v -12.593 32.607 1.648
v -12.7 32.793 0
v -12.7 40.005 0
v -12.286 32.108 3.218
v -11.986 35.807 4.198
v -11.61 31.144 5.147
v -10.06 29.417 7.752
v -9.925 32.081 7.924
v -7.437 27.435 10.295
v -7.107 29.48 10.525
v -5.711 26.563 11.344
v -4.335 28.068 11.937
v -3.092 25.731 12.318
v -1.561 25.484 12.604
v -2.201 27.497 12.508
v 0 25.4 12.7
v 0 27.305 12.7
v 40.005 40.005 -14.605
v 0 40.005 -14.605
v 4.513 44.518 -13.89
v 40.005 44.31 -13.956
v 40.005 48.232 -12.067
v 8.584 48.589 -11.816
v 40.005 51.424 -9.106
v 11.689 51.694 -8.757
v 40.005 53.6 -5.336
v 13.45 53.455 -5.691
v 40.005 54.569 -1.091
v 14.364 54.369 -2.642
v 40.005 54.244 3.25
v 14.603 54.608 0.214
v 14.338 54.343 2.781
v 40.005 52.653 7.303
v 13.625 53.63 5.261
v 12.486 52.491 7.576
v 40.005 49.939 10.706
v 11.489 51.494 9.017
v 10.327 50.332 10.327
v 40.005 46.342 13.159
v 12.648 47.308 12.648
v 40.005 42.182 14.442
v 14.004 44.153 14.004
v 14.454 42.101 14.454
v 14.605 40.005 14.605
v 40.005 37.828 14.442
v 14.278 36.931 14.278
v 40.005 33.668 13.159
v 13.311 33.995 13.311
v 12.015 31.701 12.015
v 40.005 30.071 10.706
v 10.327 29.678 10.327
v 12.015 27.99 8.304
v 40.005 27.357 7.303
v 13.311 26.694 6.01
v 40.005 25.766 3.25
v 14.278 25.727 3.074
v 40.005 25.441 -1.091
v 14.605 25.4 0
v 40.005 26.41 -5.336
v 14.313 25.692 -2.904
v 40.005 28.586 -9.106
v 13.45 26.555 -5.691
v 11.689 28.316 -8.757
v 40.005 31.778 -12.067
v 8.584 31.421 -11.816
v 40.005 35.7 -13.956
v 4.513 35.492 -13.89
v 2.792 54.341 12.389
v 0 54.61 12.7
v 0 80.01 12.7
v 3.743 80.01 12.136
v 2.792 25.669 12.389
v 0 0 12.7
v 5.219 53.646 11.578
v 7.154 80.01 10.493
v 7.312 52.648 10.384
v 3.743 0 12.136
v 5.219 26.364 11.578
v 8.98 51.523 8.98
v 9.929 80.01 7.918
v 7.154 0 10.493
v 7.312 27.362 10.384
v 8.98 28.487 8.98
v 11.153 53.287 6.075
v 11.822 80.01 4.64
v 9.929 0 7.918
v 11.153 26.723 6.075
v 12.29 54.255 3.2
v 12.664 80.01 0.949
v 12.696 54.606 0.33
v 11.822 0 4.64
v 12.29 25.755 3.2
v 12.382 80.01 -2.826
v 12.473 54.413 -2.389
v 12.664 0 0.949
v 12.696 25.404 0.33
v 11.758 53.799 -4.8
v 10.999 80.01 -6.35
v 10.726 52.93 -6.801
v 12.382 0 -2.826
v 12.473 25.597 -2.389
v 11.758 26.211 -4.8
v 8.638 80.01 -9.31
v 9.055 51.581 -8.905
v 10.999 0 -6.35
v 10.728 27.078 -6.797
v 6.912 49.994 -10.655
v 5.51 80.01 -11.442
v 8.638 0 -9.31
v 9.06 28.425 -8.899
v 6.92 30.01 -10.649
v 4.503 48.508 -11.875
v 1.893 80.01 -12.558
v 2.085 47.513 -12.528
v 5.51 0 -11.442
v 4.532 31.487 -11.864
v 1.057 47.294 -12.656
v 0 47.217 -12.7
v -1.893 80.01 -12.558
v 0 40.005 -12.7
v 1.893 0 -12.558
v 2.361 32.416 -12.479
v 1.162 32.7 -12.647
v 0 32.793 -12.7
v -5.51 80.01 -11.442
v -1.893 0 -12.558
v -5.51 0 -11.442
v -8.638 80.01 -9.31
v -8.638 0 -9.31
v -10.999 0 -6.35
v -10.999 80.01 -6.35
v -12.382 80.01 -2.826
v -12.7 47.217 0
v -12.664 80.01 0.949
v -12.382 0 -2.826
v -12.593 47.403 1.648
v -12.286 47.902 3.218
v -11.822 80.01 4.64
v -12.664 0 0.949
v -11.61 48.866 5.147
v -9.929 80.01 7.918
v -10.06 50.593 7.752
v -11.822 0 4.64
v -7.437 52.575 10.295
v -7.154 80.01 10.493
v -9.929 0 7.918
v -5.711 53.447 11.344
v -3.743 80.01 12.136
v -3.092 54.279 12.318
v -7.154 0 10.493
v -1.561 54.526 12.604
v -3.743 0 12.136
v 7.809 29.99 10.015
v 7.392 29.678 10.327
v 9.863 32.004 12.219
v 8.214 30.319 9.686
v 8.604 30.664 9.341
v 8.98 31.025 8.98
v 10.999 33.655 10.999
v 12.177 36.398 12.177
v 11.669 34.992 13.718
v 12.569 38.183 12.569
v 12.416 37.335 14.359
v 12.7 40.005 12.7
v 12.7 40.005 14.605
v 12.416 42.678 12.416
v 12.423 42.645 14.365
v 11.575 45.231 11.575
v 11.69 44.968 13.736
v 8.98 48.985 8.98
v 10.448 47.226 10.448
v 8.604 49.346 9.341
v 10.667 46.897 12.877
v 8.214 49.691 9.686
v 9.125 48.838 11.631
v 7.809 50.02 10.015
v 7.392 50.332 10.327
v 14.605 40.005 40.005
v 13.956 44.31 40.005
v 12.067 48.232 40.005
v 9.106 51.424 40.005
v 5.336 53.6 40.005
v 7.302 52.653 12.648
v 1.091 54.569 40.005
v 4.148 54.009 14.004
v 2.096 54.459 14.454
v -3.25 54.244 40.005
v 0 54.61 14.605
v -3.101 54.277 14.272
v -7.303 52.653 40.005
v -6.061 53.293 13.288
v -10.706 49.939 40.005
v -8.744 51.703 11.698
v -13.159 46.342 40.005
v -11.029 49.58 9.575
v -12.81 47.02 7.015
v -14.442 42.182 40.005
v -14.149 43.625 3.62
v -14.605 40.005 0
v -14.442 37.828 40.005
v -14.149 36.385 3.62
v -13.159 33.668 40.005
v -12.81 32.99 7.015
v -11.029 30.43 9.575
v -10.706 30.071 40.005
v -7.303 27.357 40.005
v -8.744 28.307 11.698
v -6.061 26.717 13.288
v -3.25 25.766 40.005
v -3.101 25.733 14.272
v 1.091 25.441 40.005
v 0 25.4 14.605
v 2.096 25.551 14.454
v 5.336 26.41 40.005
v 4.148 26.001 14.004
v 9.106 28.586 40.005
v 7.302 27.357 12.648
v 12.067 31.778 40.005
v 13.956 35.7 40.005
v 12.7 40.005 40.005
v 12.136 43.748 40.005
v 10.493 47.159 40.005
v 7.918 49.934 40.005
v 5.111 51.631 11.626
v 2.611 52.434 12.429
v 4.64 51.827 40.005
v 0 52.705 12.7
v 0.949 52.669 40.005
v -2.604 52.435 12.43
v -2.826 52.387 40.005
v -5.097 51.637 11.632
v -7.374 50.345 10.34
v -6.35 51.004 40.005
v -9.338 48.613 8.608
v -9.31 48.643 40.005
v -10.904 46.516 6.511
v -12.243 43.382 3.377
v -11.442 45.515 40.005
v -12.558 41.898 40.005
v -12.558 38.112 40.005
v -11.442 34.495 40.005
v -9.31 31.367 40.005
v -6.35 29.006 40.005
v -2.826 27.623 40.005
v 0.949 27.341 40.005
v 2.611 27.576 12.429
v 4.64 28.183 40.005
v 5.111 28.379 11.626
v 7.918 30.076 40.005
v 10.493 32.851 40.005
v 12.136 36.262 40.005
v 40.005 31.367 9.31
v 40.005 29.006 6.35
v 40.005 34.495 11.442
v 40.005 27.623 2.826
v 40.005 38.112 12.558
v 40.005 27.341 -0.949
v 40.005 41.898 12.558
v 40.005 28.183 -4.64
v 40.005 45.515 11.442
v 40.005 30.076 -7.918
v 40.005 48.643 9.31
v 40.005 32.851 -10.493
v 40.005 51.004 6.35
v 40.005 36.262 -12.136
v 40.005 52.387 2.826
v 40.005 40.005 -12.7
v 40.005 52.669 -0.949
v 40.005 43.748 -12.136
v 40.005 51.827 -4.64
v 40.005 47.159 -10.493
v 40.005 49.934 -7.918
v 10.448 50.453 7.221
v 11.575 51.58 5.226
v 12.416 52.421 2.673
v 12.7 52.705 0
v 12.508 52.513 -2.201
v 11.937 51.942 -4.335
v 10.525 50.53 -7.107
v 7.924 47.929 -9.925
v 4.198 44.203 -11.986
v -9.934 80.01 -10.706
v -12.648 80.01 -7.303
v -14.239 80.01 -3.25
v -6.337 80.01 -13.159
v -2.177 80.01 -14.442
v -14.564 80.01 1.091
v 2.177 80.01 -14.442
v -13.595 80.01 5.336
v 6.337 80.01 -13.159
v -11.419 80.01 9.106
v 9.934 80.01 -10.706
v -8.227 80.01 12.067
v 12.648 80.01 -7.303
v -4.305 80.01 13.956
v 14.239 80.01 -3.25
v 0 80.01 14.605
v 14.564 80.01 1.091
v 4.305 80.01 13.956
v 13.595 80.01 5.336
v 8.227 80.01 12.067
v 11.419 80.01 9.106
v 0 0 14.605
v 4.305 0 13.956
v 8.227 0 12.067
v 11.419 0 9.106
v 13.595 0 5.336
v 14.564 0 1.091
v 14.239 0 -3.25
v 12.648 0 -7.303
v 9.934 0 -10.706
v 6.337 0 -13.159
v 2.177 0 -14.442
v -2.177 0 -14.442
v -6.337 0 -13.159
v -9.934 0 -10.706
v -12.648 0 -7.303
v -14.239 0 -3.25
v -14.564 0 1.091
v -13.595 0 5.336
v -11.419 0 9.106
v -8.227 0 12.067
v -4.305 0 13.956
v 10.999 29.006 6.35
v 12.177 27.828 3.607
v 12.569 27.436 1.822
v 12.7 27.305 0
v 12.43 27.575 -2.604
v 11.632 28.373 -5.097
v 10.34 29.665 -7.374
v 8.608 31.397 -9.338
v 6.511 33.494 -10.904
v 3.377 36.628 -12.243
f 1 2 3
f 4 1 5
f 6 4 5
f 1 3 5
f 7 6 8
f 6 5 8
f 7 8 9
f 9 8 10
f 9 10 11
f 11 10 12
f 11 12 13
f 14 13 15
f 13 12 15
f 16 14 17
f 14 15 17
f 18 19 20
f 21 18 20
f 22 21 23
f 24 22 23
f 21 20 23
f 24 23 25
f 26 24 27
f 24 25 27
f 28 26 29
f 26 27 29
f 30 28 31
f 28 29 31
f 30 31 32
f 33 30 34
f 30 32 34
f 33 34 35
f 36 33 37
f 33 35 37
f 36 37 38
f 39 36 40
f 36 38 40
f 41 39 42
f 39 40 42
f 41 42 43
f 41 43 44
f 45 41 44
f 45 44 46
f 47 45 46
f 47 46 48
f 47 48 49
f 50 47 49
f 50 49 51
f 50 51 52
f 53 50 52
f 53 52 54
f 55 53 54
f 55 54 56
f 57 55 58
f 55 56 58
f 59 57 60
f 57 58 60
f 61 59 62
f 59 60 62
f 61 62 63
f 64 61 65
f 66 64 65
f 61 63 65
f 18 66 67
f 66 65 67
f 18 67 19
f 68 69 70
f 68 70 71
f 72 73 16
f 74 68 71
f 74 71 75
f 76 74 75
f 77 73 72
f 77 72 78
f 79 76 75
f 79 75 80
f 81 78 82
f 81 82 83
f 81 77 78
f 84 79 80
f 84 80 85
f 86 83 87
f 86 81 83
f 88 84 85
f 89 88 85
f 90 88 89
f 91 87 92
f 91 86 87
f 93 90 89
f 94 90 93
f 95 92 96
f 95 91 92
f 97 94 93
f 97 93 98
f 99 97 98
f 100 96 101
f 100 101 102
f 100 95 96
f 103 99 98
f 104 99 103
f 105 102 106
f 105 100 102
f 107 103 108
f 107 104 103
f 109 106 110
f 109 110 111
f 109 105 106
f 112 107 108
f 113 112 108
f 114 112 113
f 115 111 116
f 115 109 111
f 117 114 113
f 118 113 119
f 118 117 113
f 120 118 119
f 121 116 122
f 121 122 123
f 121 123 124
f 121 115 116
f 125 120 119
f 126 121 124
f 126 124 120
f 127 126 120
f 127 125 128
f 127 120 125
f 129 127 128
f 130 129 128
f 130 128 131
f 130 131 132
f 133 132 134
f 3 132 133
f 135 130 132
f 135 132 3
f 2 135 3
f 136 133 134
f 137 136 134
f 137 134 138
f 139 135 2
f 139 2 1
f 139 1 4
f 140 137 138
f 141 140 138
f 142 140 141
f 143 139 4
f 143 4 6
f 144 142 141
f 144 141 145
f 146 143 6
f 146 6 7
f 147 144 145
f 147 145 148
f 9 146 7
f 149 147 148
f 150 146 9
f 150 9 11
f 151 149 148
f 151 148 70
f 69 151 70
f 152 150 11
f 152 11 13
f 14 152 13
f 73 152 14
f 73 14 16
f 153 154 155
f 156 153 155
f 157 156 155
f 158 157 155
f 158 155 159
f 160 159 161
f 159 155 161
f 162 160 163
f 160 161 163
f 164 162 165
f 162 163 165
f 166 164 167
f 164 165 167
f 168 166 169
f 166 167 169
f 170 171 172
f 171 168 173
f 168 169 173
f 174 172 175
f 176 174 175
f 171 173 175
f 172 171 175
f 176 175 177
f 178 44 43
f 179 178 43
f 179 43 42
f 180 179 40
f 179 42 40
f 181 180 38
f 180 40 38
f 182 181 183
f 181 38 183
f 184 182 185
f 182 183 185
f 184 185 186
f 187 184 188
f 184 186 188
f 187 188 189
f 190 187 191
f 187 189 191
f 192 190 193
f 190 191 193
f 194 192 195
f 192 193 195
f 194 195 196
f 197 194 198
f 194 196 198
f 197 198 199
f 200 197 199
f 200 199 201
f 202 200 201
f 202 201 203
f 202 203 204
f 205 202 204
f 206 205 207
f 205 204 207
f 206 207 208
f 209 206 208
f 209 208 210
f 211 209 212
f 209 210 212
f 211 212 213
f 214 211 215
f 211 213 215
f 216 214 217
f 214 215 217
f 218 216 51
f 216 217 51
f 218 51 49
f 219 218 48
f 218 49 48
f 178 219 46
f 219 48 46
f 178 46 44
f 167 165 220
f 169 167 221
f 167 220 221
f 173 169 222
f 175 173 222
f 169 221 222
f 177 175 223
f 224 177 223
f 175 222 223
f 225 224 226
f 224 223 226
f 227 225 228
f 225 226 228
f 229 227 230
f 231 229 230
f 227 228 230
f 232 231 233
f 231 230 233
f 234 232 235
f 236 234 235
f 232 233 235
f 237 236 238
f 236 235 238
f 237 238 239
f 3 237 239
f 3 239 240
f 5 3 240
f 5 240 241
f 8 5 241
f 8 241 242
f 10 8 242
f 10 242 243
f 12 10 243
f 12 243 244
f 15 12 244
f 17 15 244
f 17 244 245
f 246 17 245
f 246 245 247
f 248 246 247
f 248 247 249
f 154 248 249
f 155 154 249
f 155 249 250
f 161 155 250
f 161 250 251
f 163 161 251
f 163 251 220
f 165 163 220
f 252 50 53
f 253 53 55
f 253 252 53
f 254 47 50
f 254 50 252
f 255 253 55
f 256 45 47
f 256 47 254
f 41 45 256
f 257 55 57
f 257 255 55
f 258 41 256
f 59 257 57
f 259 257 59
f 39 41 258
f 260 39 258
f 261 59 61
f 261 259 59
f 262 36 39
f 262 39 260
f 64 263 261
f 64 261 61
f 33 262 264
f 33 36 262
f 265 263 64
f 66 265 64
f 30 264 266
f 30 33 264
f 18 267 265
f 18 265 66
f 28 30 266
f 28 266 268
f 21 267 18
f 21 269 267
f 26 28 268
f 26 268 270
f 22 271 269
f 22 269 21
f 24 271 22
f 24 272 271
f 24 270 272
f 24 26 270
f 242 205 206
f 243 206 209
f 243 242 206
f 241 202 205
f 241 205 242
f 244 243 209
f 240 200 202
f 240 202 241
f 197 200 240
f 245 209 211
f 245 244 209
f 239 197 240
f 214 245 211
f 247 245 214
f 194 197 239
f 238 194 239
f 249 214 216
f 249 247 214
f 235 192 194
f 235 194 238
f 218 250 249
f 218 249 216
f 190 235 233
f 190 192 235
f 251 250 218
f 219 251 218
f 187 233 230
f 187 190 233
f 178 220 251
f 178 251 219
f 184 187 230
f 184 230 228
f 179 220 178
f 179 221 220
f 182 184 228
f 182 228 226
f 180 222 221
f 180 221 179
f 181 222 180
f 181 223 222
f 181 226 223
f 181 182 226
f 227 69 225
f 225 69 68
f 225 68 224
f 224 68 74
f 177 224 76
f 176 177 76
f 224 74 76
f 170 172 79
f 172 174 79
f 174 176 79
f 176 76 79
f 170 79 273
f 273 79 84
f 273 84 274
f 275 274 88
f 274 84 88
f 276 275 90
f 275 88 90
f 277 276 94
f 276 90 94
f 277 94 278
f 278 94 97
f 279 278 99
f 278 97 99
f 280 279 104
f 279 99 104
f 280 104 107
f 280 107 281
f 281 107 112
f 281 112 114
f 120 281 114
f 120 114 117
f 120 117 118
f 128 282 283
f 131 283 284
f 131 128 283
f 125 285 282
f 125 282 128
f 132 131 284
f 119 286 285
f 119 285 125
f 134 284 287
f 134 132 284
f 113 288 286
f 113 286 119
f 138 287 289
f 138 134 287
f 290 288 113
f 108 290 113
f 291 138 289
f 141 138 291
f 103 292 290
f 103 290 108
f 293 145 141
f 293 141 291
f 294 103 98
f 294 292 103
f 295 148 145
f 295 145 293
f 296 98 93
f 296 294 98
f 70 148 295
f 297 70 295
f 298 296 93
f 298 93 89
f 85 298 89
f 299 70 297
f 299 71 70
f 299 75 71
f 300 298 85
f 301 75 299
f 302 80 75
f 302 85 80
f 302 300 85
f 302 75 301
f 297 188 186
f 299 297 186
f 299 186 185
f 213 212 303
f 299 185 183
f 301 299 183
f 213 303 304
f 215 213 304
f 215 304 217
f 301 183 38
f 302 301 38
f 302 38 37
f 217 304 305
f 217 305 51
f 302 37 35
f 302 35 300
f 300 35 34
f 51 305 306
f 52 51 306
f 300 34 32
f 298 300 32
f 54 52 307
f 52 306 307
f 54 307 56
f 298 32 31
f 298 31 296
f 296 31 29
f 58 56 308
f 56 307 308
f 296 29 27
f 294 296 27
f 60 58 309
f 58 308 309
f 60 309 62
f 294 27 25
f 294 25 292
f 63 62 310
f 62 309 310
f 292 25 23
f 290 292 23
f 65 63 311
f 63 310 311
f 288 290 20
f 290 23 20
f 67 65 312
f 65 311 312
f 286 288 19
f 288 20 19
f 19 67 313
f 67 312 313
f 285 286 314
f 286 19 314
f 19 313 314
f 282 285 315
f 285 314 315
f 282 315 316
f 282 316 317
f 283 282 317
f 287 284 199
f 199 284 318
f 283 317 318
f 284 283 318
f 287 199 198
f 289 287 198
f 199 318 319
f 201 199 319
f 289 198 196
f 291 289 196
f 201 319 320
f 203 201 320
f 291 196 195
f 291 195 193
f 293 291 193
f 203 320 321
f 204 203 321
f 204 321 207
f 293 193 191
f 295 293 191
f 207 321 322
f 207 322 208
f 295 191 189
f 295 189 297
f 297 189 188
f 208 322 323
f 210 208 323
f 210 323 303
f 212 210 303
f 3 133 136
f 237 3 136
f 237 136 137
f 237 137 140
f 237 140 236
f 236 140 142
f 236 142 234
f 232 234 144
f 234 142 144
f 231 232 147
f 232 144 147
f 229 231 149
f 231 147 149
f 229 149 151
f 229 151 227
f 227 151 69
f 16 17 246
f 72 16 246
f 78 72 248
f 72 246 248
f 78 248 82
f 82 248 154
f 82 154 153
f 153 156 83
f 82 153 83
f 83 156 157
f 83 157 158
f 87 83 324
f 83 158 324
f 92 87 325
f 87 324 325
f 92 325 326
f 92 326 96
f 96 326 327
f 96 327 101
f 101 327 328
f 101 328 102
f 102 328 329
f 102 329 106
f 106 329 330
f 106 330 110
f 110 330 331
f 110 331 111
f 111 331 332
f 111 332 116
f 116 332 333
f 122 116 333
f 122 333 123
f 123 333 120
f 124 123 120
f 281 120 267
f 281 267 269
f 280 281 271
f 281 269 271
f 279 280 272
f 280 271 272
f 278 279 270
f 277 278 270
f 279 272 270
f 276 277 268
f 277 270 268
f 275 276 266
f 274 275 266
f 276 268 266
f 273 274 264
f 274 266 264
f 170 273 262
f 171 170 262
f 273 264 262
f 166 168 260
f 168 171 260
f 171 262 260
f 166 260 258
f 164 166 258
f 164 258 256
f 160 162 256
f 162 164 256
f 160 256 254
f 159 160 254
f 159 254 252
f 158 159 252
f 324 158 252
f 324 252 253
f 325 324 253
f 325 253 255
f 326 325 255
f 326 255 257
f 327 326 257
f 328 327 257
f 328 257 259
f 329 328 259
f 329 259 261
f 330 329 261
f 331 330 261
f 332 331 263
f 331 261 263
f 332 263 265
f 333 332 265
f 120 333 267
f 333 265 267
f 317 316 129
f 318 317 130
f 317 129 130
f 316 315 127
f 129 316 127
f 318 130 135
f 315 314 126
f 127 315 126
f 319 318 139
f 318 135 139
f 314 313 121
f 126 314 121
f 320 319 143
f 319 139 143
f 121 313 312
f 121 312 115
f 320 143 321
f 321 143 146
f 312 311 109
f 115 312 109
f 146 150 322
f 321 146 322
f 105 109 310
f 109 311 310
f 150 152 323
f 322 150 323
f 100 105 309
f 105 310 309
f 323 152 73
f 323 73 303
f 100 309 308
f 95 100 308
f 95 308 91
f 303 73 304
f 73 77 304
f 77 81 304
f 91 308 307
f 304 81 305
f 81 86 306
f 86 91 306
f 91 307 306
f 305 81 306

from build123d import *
from OCP.BRepAlgoAPI import BRepAlgoAPI_Cut
from OCP.TopTools import TopTools_ListOfShape

# Parameters (mm, degrees)
SKETCH3_R           = 14.605
SKETCH3_R_2         = 12.7
BOSS_EXTRUDE2_DEPTH = 80.01
SKETCH4_R           = 14.605
BOSS_EXTRUDE3_DEPTH = 40.005
SKETCH5_R           = 12.7
CUT_EXTRUDE1_DEPTH  = 40.005
SKETCH6_R           = 14.605
BOSS_EXTRUDE4_DEPTH = 40.005
SKETCH7_R           = 12.7
CUT_EXTRUDE2_DEPTH  = 40.005
SKETCH8_R           = 12.7
CUT_EXTRUDE3_DEPTH  = 98.991837283
CUT_EXTRUDE4_REACH  = 106.806
SKETCH9_R           = 12.7


with BuildPart() as part:
    # Sketch3 → Boss-Extrude2 (new body)
    with BuildSketch(Plane(origin=(0, 0, 0), x_dir=(1, 0, 0), z_dir=(0, 1, 0))):
        with Locations(Location((0, 0, 0), (0, 0, 270))):
            Circle(SKETCH3_R)
        with Locations(Location((0, 0, 0), (0, 0, 270))):
            Circle(SKETCH3_R_2, mode=Mode.SUBTRACT)
    extrude(amount=BOSS_EXTRUDE2_DEPTH)

    # Sketch4 → Boss-Extrude3 (add)
    with BuildSketch(Plane.XY):
        with Locations((0, 40.005)):
            Circle(SKETCH4_R)
    extrude(amount=BOSS_EXTRUDE3_DEPTH)

    # Sketch5 → Cut-Extrude1 (cut)
    with BuildSketch(Plane.XY.offset(40.005)):
        with Locations((0, 40.005)):
            Circle(SKETCH5_R)
    extrude(amount=-CUT_EXTRUDE1_DEPTH, mode=Mode.SUBTRACT)

    # Sketch6 → Boss-Extrude4 (add)
    with BuildSketch(Plane(origin=(0, 0, 0), x_dir=(0, 0, -1), z_dir=(1, 0, 0))):
        with Locations((0, 40.005)):
            Circle(SKETCH6_R)
    extrude(amount=BOSS_EXTRUDE4_DEPTH)

    # Sketch7 → Cut-Extrude2 (cut)
    with BuildSketch(Plane(origin=(40.005, 0, 0), x_dir=(0, 0, -1), z_dir=(1, 0, 0))):
        with Locations((0, 40.005)):
            Circle(SKETCH7_R)
    extrude(amount=-CUT_EXTRUDE2_DEPTH, mode=Mode.SUBTRACT)


with BuildPart() as cut_extrude3_tool:
    # Sketch8 → Cut-Extrude3 (new, through all)
    with BuildSketch(Plane(origin=(0, 80.01, 0), x_dir=(1, 0, 0), z_dir=(0, 1, 0))):
        with Locations(Location((0, 0, 0), (0, 0, 270))):
            Circle(SKETCH8_R)
    extrude(amount=-CUT_EXTRUDE3_DEPTH)


with BuildPart() as part_1:
    add(part.part)

    # Cut-Extrude3: cut by cut_extrude3_tool, with a tolerance
    cut_extrude3_stock = TopTools_ListOfShape()
    cut_extrude3_stock.Append(part_1.part.wrapped)
    cut_extrude3_tools = TopTools_ListOfShape()
    cut_extrude3_tools.Append(cut_extrude3_tool.part.wrapped)
    cut_extrude3_cut = BRepAlgoAPI_Cut()
    cut_extrude3_cut.SetArguments(cut_extrude3_stock)
    cut_extrude3_cut.SetTools(cut_extrude3_tools)
    cut_extrude3_cut.SetFuzzyValue(0.00001)
    cut_extrude3_cut.Build()
    add(Compound.cast(cut_extrude3_cut.Shape()).solids(), mode=Mode.REPLACE)

    # Sketch9 → Cut-Extrude4 (cut, up to next)
    with BuildSketch(Plane.XY.offset(40.005), mode=Mode.PRIVATE) as cut_extrude4_sk1:
        with Locations((0, 40.005)):
            Circle(SKETCH9_R)
    cut_extrude4_tool1 = extrude(cut_extrude4_sk1.sketch, amount=-CUT_EXTRUDE4_REACH, mode=Mode.PRIVATE) & part_1.part
    add(cut_extrude4_tool1.solids().sort_by_distance((0, 40.005, 40.005))[0], mode=Mode.SUBTRACT)


solid = part_1.part
